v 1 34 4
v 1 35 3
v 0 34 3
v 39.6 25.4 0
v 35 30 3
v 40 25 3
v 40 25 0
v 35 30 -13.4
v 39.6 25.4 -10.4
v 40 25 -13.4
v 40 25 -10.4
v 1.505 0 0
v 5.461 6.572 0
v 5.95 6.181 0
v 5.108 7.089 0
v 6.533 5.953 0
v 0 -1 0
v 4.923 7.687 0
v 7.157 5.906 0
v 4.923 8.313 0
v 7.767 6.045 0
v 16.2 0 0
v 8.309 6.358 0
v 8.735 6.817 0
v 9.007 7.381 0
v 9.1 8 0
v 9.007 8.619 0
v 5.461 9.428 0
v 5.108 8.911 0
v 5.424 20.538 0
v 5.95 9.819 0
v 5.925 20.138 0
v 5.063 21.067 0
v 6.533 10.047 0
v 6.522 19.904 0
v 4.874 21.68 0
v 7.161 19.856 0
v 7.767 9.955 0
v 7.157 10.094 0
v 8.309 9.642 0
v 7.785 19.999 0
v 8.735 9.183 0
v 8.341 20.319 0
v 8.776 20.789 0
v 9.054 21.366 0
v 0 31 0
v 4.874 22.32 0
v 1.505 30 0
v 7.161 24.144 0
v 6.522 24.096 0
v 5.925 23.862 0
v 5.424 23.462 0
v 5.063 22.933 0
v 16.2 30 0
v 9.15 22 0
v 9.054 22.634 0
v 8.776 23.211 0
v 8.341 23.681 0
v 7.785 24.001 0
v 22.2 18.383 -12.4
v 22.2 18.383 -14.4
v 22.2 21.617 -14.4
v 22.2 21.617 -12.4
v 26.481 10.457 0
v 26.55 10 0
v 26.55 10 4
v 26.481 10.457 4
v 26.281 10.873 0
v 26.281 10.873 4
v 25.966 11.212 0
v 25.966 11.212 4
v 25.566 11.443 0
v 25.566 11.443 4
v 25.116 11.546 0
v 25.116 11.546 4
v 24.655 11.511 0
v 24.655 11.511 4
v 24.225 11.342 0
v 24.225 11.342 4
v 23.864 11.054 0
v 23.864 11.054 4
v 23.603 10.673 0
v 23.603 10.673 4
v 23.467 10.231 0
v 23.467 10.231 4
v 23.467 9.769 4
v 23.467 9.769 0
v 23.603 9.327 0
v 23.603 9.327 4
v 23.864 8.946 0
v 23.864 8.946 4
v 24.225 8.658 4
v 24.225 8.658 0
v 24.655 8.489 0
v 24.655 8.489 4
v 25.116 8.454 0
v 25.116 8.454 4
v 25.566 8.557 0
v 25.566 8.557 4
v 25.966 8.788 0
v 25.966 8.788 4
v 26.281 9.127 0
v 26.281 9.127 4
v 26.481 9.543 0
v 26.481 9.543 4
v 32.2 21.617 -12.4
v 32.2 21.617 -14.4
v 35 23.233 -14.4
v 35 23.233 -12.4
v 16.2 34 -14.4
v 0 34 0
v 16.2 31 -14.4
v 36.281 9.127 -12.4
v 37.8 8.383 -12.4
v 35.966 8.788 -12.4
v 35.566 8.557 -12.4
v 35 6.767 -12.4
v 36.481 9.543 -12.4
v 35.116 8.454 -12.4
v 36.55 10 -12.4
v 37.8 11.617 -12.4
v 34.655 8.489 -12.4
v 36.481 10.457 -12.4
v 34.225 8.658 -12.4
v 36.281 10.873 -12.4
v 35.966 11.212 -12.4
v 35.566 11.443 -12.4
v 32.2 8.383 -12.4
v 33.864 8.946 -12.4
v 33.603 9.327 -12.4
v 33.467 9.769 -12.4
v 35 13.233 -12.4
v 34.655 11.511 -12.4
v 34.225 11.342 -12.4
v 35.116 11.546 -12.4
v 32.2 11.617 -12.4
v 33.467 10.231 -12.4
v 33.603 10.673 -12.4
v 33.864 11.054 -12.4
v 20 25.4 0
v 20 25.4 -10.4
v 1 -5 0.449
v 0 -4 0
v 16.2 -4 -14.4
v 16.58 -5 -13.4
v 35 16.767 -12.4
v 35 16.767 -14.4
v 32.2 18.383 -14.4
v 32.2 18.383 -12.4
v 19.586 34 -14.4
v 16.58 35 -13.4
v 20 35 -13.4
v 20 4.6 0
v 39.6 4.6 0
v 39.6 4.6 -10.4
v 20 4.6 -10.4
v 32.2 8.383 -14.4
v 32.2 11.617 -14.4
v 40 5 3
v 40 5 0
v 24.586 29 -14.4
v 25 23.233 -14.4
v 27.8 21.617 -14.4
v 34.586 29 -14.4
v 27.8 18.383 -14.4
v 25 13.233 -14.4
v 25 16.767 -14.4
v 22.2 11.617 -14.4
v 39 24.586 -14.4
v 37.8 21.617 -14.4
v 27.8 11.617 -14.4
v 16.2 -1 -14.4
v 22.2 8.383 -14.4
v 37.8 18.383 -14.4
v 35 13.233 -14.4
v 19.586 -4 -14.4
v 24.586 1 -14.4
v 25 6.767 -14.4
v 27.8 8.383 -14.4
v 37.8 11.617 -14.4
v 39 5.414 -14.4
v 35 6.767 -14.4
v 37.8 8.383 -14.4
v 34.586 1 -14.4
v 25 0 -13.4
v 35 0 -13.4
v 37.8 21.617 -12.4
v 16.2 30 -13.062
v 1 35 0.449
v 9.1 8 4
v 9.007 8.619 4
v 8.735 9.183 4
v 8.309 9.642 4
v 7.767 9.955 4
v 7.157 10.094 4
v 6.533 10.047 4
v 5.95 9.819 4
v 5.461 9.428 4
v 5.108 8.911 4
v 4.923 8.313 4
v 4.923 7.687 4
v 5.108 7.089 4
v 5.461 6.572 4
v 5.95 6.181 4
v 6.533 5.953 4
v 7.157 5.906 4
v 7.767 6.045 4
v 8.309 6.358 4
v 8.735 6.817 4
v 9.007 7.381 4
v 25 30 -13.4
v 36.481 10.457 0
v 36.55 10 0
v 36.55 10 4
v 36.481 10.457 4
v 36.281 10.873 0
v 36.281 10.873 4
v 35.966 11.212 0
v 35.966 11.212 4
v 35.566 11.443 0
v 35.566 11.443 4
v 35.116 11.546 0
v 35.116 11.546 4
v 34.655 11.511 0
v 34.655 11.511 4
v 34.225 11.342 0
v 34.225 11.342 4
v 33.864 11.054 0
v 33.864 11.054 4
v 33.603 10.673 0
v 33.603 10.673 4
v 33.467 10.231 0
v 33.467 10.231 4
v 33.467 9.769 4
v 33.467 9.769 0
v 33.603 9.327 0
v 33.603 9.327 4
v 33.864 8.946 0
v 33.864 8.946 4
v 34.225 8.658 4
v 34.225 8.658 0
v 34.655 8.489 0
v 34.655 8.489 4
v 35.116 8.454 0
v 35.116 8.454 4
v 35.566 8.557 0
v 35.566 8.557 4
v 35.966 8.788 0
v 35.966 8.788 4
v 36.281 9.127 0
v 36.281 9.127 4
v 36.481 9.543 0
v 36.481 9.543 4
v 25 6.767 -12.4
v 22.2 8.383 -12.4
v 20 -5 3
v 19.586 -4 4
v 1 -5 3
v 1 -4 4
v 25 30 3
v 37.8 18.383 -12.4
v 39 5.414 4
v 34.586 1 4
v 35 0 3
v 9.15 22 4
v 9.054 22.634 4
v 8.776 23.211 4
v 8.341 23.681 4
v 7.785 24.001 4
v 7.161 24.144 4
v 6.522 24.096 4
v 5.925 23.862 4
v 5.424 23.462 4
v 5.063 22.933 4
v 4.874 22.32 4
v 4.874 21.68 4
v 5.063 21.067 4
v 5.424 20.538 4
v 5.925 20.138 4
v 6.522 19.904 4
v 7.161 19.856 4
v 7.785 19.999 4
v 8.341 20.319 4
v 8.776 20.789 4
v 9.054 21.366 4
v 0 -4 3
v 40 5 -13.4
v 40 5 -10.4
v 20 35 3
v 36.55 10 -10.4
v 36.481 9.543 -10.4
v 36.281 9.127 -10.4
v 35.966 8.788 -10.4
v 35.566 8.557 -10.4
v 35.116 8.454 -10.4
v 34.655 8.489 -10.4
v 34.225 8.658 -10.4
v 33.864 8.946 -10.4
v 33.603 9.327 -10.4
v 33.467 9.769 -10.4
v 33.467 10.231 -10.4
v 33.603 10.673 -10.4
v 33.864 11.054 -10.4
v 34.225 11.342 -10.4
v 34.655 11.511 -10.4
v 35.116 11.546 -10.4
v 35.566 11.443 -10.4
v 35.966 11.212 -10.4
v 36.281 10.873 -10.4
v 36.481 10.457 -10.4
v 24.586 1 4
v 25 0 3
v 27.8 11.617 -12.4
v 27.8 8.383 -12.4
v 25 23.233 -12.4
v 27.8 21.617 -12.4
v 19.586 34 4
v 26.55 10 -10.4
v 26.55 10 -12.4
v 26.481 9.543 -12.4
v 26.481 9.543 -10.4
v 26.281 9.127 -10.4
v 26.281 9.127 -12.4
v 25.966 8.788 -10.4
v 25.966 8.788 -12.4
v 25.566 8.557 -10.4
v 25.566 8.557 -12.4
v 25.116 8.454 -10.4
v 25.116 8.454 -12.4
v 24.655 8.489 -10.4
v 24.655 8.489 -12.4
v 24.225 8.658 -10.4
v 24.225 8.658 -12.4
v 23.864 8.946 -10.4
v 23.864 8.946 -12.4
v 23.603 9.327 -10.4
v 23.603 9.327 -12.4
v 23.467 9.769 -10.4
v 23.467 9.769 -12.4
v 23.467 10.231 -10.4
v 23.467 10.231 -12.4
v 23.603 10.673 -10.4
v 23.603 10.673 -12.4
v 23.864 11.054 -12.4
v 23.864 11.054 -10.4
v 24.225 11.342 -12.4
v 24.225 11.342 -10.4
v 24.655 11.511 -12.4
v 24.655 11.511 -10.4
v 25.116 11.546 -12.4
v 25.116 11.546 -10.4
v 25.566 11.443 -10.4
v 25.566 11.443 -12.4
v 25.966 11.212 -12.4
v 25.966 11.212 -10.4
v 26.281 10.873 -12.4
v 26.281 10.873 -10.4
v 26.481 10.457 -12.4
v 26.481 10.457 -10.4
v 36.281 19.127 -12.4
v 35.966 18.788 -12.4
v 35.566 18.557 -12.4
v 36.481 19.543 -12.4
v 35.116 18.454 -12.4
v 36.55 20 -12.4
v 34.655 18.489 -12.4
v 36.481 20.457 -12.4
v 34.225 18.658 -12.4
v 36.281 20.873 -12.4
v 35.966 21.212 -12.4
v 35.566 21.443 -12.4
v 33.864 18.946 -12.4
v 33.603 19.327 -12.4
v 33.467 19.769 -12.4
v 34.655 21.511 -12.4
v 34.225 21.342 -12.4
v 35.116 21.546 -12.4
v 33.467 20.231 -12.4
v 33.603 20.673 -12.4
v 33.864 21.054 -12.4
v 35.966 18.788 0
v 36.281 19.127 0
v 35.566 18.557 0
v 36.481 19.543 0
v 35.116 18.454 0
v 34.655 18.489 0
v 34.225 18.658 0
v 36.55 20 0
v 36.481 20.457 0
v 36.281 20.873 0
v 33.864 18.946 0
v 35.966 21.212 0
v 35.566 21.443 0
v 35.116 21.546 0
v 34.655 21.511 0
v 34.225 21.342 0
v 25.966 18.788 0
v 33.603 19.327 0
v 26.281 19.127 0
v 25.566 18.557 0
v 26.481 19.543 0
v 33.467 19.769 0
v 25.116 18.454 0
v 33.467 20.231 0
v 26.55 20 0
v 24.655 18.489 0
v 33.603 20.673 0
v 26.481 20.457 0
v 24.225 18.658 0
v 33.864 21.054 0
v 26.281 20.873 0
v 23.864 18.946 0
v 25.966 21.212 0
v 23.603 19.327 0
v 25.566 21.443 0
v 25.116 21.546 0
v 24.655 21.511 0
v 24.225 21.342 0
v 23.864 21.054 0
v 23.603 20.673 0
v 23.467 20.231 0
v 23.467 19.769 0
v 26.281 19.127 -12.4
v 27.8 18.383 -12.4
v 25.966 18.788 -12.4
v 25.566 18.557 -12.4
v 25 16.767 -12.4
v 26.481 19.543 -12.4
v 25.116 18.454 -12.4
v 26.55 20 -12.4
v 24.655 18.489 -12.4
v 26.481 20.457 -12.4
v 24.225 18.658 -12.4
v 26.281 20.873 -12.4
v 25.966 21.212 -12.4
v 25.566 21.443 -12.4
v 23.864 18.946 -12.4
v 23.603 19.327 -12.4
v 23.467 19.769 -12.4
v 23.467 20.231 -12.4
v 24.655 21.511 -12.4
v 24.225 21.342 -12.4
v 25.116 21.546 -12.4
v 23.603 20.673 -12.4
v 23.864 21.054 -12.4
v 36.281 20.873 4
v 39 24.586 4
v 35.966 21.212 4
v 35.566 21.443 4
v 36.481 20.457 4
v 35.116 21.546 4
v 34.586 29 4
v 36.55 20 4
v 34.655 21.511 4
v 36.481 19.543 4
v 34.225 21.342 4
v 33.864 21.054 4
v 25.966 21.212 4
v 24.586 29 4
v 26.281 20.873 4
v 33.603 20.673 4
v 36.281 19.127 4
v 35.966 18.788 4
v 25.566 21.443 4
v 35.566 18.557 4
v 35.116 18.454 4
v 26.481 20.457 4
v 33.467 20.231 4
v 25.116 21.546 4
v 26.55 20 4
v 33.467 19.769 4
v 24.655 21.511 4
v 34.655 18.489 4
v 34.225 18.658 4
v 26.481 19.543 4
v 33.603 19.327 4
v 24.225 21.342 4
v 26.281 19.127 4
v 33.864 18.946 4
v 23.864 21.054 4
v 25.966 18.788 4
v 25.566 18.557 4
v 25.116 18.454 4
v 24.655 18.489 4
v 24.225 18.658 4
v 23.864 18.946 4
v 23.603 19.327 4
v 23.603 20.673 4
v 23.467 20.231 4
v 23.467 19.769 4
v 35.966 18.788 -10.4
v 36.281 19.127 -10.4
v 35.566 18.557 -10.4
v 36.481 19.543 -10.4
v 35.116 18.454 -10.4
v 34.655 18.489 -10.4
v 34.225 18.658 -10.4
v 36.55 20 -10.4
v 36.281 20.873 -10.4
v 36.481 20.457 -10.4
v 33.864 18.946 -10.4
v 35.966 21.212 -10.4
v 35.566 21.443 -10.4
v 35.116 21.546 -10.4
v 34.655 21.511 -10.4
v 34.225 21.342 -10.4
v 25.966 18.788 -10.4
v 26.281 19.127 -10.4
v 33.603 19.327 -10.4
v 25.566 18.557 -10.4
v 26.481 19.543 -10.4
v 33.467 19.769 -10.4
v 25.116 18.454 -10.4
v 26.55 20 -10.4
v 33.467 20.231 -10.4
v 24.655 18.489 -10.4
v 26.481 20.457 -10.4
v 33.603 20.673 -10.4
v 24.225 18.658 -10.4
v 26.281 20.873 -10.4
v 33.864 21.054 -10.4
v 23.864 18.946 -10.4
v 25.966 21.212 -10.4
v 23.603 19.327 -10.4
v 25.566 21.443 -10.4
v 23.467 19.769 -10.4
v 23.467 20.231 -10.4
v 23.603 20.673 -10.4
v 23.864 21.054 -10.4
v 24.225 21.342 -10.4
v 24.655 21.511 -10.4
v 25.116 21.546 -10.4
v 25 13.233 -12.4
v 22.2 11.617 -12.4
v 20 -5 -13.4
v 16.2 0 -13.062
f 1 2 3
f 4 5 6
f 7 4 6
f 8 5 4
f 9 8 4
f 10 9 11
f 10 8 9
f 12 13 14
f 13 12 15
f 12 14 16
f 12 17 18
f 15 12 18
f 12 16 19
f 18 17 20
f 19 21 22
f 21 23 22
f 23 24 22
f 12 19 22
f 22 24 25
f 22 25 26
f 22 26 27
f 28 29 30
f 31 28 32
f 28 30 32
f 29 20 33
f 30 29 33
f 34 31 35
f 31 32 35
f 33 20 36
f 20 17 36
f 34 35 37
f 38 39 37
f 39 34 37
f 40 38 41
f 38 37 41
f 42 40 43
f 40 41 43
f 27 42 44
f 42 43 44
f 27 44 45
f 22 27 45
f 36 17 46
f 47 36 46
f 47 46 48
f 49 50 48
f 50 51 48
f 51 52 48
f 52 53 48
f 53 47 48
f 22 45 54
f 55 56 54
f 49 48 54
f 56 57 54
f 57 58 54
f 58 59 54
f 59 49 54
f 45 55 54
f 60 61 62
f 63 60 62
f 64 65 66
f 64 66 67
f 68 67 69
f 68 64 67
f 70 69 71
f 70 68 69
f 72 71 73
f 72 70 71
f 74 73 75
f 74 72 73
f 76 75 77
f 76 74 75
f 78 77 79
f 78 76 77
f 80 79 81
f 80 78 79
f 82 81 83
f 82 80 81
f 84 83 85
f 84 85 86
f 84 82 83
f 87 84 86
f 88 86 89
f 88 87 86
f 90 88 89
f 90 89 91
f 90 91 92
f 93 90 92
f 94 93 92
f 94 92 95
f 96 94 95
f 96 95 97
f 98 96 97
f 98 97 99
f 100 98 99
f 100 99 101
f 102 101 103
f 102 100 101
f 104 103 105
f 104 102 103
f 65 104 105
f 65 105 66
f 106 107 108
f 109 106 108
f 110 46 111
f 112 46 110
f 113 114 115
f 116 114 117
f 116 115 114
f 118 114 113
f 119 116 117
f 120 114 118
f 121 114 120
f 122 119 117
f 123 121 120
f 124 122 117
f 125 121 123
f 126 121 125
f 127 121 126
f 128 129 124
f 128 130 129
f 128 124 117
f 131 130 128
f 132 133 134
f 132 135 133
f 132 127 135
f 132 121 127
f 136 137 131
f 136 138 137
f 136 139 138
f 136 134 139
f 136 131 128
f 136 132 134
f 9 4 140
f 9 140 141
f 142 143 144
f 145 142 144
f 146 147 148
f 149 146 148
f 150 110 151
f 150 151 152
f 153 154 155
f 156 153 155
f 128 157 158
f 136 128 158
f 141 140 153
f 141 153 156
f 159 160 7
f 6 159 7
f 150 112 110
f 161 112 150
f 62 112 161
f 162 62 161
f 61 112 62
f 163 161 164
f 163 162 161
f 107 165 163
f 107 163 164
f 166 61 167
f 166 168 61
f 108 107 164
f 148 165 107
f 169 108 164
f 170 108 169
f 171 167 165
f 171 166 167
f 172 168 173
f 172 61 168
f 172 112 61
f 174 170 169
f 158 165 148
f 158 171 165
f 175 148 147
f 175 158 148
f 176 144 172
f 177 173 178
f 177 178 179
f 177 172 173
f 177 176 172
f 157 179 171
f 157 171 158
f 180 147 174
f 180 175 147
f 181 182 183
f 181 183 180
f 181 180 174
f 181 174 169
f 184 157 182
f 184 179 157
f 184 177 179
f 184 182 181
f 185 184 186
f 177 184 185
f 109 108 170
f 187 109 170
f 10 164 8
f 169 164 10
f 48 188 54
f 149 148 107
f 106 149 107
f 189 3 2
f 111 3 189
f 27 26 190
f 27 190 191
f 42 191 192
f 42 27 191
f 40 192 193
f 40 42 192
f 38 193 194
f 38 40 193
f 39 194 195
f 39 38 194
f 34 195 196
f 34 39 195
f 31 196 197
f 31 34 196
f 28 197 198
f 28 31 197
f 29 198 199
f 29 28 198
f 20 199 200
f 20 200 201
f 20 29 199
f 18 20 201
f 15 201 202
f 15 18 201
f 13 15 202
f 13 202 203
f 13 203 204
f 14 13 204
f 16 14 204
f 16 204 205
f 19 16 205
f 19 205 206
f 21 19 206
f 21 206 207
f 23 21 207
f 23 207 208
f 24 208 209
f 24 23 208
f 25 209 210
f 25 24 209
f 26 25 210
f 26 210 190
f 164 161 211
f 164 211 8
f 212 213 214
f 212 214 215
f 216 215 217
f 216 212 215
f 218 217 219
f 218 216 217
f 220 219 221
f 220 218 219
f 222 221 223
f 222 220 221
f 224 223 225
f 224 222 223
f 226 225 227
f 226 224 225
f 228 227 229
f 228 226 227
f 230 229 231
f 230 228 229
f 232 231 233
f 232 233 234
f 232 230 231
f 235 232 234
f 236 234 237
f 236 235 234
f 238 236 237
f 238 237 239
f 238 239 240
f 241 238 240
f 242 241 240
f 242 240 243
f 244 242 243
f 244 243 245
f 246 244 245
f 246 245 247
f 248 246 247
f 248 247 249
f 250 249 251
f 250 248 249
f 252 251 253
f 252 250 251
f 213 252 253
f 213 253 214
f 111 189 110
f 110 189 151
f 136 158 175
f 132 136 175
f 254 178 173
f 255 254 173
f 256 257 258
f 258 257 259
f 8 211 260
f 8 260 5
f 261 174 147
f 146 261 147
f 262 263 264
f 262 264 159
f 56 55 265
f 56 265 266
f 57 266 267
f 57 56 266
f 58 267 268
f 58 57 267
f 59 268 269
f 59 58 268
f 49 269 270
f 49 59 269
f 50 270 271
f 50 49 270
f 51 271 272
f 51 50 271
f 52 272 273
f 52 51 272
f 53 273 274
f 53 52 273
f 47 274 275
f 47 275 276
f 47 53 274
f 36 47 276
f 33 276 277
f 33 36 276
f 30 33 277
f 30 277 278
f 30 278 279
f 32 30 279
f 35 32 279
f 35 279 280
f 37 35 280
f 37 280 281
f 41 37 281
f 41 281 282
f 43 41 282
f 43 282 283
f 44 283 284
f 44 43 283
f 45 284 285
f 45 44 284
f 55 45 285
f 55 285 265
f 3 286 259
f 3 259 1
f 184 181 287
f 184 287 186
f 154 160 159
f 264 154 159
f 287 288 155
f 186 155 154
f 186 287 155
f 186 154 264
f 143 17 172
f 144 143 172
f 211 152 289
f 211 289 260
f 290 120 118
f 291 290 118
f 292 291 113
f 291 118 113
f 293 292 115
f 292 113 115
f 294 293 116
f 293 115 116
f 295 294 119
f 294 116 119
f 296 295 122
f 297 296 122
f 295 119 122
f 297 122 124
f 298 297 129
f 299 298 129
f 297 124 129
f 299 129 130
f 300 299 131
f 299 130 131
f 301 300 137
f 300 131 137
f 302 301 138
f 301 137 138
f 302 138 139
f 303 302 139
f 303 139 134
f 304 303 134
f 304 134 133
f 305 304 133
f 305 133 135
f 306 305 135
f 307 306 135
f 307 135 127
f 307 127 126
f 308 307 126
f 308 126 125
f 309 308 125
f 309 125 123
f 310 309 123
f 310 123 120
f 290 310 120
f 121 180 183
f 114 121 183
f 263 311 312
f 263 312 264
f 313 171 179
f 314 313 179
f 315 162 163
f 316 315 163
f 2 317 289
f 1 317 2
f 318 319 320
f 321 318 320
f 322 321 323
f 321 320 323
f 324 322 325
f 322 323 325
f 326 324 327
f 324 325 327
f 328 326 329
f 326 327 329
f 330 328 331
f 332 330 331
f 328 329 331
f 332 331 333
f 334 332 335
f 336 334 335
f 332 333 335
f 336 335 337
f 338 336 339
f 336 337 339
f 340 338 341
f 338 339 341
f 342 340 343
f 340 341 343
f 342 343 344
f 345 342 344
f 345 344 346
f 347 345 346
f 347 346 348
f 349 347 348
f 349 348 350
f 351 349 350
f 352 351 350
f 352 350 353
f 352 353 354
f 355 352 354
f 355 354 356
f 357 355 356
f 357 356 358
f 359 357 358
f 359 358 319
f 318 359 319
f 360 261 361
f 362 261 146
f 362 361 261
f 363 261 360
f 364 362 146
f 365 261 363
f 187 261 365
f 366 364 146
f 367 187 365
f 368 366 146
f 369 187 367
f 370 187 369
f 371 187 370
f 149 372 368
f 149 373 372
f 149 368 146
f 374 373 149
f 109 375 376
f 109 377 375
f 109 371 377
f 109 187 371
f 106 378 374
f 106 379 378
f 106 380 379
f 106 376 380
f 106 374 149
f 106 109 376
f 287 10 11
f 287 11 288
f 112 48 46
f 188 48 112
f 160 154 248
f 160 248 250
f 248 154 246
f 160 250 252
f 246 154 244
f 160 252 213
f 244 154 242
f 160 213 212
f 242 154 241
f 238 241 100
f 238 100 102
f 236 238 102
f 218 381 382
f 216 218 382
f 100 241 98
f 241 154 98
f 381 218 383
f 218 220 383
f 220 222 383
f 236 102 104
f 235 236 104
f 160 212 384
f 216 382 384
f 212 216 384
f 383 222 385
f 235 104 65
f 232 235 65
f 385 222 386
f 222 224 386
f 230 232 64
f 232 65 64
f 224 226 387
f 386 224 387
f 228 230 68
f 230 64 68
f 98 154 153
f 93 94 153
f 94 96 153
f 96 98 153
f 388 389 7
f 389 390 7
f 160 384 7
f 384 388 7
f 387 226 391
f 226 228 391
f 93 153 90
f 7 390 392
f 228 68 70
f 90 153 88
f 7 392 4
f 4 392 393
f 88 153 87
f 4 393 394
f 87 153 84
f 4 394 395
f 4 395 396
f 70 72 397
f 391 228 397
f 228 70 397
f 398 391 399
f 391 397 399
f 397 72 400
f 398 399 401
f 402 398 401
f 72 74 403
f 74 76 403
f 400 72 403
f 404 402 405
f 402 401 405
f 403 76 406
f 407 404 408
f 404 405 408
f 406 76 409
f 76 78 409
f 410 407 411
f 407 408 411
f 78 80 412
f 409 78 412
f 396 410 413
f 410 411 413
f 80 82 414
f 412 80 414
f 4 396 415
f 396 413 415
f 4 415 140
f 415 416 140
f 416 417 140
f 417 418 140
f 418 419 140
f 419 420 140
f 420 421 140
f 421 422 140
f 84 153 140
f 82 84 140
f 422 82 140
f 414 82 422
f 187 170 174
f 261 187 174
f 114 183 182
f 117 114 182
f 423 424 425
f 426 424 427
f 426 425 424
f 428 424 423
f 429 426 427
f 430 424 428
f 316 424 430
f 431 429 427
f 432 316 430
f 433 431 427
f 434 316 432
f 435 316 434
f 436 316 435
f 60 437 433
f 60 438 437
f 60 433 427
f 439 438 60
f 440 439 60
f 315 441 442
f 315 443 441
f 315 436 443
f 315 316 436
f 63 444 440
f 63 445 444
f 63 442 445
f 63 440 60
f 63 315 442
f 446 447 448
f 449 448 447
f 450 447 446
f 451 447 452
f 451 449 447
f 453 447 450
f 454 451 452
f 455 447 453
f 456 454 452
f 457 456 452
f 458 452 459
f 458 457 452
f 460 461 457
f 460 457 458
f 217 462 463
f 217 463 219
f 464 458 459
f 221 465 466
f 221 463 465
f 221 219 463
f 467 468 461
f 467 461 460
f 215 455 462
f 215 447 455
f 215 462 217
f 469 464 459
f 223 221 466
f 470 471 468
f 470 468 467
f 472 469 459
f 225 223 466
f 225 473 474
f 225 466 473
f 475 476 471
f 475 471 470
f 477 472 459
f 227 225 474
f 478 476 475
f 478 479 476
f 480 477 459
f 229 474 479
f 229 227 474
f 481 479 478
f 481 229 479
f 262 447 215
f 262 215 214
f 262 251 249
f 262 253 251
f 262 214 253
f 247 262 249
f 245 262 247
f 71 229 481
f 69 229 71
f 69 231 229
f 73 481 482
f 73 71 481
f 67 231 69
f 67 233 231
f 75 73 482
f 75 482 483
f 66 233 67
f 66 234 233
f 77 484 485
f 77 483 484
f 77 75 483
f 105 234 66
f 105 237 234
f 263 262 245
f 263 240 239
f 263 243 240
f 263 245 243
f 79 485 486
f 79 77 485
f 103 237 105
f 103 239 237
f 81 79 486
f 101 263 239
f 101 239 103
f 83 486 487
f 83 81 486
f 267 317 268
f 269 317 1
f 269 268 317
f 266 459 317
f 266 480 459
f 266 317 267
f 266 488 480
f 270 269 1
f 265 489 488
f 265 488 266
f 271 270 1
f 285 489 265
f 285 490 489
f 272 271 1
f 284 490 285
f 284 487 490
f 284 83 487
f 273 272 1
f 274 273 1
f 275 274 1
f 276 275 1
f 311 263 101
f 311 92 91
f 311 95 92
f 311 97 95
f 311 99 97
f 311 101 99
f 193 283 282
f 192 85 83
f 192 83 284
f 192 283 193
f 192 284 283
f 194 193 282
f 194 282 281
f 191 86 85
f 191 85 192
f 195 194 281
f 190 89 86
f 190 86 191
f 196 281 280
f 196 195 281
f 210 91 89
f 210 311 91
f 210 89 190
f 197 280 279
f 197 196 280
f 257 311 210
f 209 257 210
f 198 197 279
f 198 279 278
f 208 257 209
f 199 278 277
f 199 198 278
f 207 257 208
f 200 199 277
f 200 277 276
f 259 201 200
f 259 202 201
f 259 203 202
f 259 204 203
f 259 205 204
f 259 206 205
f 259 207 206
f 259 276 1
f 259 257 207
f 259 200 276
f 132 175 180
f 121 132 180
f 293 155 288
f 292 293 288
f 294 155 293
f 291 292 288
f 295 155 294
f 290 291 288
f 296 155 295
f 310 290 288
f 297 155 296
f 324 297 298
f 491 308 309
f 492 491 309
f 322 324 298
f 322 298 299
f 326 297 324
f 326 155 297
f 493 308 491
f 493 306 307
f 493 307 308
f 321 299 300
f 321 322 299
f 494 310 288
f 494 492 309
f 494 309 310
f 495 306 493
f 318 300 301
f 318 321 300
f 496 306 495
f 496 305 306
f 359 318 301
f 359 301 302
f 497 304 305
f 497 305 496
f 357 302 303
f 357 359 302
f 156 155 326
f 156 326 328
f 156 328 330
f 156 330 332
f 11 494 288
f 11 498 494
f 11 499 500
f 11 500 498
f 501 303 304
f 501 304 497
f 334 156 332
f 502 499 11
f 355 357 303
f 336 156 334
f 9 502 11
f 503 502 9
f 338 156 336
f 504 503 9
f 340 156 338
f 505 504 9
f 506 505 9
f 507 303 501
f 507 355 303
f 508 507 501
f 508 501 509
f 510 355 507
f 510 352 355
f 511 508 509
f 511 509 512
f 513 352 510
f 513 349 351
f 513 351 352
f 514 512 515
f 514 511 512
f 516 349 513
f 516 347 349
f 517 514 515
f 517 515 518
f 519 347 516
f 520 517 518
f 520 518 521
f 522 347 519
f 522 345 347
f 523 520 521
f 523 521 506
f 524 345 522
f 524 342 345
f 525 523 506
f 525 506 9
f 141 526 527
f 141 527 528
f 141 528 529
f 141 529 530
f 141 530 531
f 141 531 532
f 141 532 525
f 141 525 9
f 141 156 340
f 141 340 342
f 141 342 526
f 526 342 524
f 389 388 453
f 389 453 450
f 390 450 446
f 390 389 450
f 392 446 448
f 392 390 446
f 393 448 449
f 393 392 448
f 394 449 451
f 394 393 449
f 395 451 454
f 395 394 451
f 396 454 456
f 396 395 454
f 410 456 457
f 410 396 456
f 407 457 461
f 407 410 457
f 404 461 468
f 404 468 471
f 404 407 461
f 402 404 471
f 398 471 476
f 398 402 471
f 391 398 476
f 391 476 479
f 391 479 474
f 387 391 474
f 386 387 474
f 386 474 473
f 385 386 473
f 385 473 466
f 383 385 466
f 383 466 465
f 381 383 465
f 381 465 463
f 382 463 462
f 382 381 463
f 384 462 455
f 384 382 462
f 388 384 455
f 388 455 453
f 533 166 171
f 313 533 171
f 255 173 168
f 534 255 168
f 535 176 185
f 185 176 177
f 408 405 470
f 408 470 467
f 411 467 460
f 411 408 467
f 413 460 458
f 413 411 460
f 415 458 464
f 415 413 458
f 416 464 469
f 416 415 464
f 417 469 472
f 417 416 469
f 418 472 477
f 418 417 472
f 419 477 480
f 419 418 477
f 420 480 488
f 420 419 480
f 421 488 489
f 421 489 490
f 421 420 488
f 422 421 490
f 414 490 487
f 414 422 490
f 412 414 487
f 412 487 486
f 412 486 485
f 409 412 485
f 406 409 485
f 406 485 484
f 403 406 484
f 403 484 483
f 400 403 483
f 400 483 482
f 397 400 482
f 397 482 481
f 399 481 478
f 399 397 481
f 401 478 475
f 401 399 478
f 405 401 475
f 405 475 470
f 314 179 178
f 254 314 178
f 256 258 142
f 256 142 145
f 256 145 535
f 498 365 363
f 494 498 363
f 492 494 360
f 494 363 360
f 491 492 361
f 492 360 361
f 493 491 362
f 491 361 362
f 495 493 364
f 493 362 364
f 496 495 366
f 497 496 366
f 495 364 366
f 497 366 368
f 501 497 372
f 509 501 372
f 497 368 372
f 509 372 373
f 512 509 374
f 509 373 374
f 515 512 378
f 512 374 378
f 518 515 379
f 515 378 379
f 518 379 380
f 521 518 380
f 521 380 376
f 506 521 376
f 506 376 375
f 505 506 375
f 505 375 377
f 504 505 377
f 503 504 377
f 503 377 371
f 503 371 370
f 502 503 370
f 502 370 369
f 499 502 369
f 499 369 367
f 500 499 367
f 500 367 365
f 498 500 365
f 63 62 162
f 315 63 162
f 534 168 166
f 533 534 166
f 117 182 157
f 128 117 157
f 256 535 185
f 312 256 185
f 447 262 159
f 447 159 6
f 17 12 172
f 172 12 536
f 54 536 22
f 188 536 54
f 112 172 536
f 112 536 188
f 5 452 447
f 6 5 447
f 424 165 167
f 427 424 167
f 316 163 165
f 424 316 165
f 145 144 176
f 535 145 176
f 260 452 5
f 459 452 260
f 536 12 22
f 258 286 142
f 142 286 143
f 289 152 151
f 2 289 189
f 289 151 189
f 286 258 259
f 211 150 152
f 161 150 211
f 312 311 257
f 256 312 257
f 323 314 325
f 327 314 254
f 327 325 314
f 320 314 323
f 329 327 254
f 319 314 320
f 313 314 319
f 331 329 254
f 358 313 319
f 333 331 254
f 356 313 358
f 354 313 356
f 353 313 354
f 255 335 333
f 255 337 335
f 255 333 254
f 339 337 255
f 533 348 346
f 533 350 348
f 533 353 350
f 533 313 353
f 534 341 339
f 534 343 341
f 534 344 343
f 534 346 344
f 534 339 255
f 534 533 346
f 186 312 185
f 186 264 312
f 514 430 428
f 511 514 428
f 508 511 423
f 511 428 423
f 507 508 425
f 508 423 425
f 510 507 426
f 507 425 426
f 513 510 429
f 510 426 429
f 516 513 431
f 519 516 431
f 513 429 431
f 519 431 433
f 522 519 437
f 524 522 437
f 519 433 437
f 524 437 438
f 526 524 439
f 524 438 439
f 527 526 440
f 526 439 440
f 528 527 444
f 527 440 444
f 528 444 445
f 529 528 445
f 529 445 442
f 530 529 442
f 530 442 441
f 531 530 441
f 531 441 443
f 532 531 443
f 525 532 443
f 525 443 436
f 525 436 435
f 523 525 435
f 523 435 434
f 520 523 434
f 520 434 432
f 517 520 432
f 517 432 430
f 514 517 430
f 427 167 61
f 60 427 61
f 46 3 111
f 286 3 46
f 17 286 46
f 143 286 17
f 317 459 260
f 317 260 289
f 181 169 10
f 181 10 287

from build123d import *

# Parameters (mm, degrees)
SKETCH_1_W          = 40
SKETCH_1_H          = 30
SKETCH_1_R          = 2.15
SKETCH_1_R_2        = 2.1
SKETCH_1_R_3        = 1.55
EXTRUDE_1_DEPTH     = 4
CHAMFER_1_SIZE      = 5
EXTRUDE_2_DEPTH     = 10.4
EXTRUDE_START       = 4
SKETCH_4_R          = 1.55
EXTRUDE_3_DEPTH     = 4
EXTRUDE_4_DEPTH     = 5
EXTRUDE_5_DEPTH     = 5
CHAMFER_3_SIZE      = 10
CHAMFER_4_SIZE      = 1
CUT_EXTRUDE_1_DEPTH = 2
SKETCH_10_W         = 10.4
SKETCH_10_H         = 20.8
CUT_EXTRUDE_2_DEPTH = 43.806074335


with BuildPart() as part:
    # 草图1 → 凸台-拉伸1 (new body)
    with BuildSketch(Plane.XY):
        with Locations((20, 15)):
            Rectangle(SKETCH_1_W, SKETCH_1_H)
        with Locations((7, 22)):
            Circle(SKETCH_1_R, mode=Mode.SUBTRACT)
        with Locations((7, 8)):
            Circle(SKETCH_1_R_2, mode=Mode.SUBTRACT)
        with Locations((35, 20)):
            Circle(SKETCH_1_R_3, mode=Mode.SUBTRACT)
        with Locations((25, 20)):
            Circle(SKETCH_1_R_3, mode=Mode.SUBTRACT)
        with Locations((25, 10)):
            Circle(SKETCH_1_R_3, mode=Mode.SUBTRACT)
        with Locations((35, 10)):
            Circle(SKETCH_1_R_3, mode=Mode.SUBTRACT)
    extrude(amount=EXTRUDE_1_DEPTH)

    # 倒角1
    chamfer_1_edges = [part.edges().sort_by_distance(p)[0] for p in [
        (40, 30, 2),
        (40, 0, 2),
    ]]
    chamfer(chamfer_1_edges, length=CHAMFER_1_SIZE)

    # 草图3 → 凸台-拉伸2 (add)
    with BuildSketch(Plane(origin=(0, 0, 0), x_dir=(-1, 0, 0), z_dir=(0, 0, -1))):
        Polygon((-40, 25), (-20, 25), (-20, 5), (-40, 5), (-35, 0), (-16.2, 0), (-16.2, 30), (-35, 30), align=None)
    extrude(amount=EXTRUDE_2_DEPTH)

    # 草图4 → 凸台-拉伸3 (add)
    with BuildSketch(Plane(origin=(0, 0, -10.4), x_dir=(-1, 0, 0), z_dir=(0, 0, -1)).offset(EXTRUDE_START)):
        Polygon((-40, 25), (-40, 5), (-35, 0), (-16.2, 0), (-16.2, 30), (-35, 30), align=None)
        with Locations(Location((-35, 20, 0), (0, 0, 180))):
            Circle(SKETCH_4_R, mode=Mode.SUBTRACT)
        with Locations(Location((-25, 20, 0), (0, 0, 180))):
            Circle(SKETCH_4_R, mode=Mode.SUBTRACT)
        with Locations(Location((-25, 10, 0), (0, 0, 180))):
            Circle(SKETCH_4_R, mode=Mode.SUBTRACT)
        with Locations(Location((-35, 10, 0), (0, 0, 180))):
            Circle(SKETCH_4_R, mode=Mode.SUBTRACT)
    extrude(amount=-EXTRUDE_3_DEPTH)

    # 草图7 → 凸台-拉伸4 (add)
    with BuildSketch(Plane.XZ):
        Polygon((0, 0), (16.2, -14.4), (30, -14.4), (30, 4), (0, 4), align=None)
    extrude(amount=EXTRUDE_4_DEPTH)

    # 草图8 → 凸台-拉伸5 (add)
    with BuildSketch(Plane(origin=(0, 30, 0), x_dir=(1, 0, 0), z_dir=(0, 1, 0))):
        Polygon((0, 0), (16.2, 14.4), (30, 14.4), (30, -4), (0, -4), align=None)
    extrude(amount=EXTRUDE_5_DEPTH)

    # 倒角3
    # the kernel refuses this chamfer: 10 mm, written as the material it takes off along each edge
    with BuildSketch(Plane(origin=(30, 35, -40.11682988), x_dir=(-0.9996219169112968, 0.027495876610586317, 0), z_dir=(0, 0, 1))) as chamfer_3_piece_1_section:
        Polygon((CHAMFER_3_SIZE * 0.999621916911, CHAMFER_3_SIZE * 0.0274958766106), (-CHAMFER_3_SIZE * 0.0274958766106, CHAMFER_3_SIZE * 0.999621916911), (0, 0), align=None)
    chamfer_3_piece_1 = extrude(amount=69.833659759, mode=Mode.PRIVATE)
    chamfer_3_piece_1 = split(chamfer_3_piece_1, bisect_by=Plane(origin=(26.065989159, 30, -5.2), z_dir=(0, 1, 0)), keep=Keep.TOP, mode=Mode.PRIVATE)
    add(chamfer_3_piece_1, mode=Mode.SUBTRACT)
    with BuildSketch(Plane(origin=(30, -5, -40.11682988), x_dir=(-0.9996219169112968, -0.027495876610586403, 0), z_dir=(0, 0, 1))) as chamfer_3_piece_2_section:
        Polygon((CHAMFER_3_SIZE * 0.999621916911, -CHAMFER_3_SIZE * 0.0274958766106), (-CHAMFER_3_SIZE * 0.0274958766106, -CHAMFER_3_SIZE * 0.999621916911), (0, 0), align=None)
    chamfer_3_piece_2 = extrude(amount=69.833659759, mode=Mode.PRIVATE)
    chamfer_3_piece_2 = split(chamfer_3_piece_2, bisect_by=Plane(origin=(26.065989159, 0, -5.2), z_dir=(0, -1, 0)), keep=Keep.TOP, mode=Mode.PRIVATE)
    add(chamfer_3_piece_2, mode=Mode.SUBTRACT)

    # 倒角4
    chamfer_4_edges = [part.edges().sort_by_distance(p)[0] for p in [
        (30, 0, 4),
        (8.1, 0, -7.2),
        (0, -5, 2),
        (8.1, -5, -7.2),
        (18.1, -5, -14.4),
        (30, 30, -14.4),
        (8.1, 30, -7.2),
        (8.1, 35, -7.2),
        (0, 35, 2),
        (10, 35, 4),
        (18.1, 35, -14.4),
        (22.5, -2.5, -14.4),
        (22.5, 32.5, -14.4),
        (10, -5, 4),
        (22.5, -2.5, 4),
        (22.5, 32.5, 4),
        (40, 15, 4),
        (30, 30, 4),
        (37.5, 27.5, 4),
        (37.5, 2.5, 4),
        (0, 15, 4),
        (37.5, 27.5, -14.4),
        (40, 15, -14.4),
        (37.5, 2.5, -14.4),
        (30, 0, -14.4),
    ]]
    chamfer(chamfer_4_edges, length=CHAMFER_4_SIZE)

    # 草图9 → 切除-拉伸1 (cut)
    with BuildSketch(Plane(origin=(0, 0, -14.4), x_dir=(-1, 0, 0), z_dir=(0, 0, -1))):
        Polygon((-35, 16.766838493), (-32.2, 18.383419246), (-32.2, 21.616580754), (-35, 23.233161507), (-37.8, 21.616580754), (-37.8, 18.383419246), align=None)
        Polygon((26.245937902, 18.719863705), (29.045937902, 20.336444458), (29.045937902, 23.569605966), (26.245937902, 25.186186719), (23.445937902, 23.569605966), (23.445937902, 20.336444458), align=None)
        Polygon((-35, 6.766838493), (-32.2, 8.383419246), (-32.2, 11.616580754), (-35, 13.233161507), (-37.8, 11.616580754), (-37.8, 8.383419246), align=None)
        Polygon((-25, 6.766838493), (-22.2, 8.383419246), (-22.2, 11.616580754), (-25, 13.233161507), (-27.8, 11.616580754), (-27.8, 8.383419246), align=None)
        Polygon((-25, 16.766838493), (-22.2, 18.383419246), (-22.2, 21.616580754), (-25, 23.233161507), (-27.8, 21.616580754), (-27.8, 18.383419246), align=None)
    extrude(amount=-CUT_EXTRUDE_1_DEPTH, mode=Mode.SUBTRACT)

    # 草图10 → 切除-拉伸2 (cut, through all)
    with BuildSketch(Plane(origin=(20, 0, 0), x_dir=(0, 0, -1), z_dir=(1, 0, 0))):
        with Locations((5.2, 15)):
            Rectangle(SKETCH_10_W, SKETCH_10_H)
    extrude(amount=CUT_EXTRUDE_2_DEPTH, mode=Mode.SUBTRACT)


solid = part.part
